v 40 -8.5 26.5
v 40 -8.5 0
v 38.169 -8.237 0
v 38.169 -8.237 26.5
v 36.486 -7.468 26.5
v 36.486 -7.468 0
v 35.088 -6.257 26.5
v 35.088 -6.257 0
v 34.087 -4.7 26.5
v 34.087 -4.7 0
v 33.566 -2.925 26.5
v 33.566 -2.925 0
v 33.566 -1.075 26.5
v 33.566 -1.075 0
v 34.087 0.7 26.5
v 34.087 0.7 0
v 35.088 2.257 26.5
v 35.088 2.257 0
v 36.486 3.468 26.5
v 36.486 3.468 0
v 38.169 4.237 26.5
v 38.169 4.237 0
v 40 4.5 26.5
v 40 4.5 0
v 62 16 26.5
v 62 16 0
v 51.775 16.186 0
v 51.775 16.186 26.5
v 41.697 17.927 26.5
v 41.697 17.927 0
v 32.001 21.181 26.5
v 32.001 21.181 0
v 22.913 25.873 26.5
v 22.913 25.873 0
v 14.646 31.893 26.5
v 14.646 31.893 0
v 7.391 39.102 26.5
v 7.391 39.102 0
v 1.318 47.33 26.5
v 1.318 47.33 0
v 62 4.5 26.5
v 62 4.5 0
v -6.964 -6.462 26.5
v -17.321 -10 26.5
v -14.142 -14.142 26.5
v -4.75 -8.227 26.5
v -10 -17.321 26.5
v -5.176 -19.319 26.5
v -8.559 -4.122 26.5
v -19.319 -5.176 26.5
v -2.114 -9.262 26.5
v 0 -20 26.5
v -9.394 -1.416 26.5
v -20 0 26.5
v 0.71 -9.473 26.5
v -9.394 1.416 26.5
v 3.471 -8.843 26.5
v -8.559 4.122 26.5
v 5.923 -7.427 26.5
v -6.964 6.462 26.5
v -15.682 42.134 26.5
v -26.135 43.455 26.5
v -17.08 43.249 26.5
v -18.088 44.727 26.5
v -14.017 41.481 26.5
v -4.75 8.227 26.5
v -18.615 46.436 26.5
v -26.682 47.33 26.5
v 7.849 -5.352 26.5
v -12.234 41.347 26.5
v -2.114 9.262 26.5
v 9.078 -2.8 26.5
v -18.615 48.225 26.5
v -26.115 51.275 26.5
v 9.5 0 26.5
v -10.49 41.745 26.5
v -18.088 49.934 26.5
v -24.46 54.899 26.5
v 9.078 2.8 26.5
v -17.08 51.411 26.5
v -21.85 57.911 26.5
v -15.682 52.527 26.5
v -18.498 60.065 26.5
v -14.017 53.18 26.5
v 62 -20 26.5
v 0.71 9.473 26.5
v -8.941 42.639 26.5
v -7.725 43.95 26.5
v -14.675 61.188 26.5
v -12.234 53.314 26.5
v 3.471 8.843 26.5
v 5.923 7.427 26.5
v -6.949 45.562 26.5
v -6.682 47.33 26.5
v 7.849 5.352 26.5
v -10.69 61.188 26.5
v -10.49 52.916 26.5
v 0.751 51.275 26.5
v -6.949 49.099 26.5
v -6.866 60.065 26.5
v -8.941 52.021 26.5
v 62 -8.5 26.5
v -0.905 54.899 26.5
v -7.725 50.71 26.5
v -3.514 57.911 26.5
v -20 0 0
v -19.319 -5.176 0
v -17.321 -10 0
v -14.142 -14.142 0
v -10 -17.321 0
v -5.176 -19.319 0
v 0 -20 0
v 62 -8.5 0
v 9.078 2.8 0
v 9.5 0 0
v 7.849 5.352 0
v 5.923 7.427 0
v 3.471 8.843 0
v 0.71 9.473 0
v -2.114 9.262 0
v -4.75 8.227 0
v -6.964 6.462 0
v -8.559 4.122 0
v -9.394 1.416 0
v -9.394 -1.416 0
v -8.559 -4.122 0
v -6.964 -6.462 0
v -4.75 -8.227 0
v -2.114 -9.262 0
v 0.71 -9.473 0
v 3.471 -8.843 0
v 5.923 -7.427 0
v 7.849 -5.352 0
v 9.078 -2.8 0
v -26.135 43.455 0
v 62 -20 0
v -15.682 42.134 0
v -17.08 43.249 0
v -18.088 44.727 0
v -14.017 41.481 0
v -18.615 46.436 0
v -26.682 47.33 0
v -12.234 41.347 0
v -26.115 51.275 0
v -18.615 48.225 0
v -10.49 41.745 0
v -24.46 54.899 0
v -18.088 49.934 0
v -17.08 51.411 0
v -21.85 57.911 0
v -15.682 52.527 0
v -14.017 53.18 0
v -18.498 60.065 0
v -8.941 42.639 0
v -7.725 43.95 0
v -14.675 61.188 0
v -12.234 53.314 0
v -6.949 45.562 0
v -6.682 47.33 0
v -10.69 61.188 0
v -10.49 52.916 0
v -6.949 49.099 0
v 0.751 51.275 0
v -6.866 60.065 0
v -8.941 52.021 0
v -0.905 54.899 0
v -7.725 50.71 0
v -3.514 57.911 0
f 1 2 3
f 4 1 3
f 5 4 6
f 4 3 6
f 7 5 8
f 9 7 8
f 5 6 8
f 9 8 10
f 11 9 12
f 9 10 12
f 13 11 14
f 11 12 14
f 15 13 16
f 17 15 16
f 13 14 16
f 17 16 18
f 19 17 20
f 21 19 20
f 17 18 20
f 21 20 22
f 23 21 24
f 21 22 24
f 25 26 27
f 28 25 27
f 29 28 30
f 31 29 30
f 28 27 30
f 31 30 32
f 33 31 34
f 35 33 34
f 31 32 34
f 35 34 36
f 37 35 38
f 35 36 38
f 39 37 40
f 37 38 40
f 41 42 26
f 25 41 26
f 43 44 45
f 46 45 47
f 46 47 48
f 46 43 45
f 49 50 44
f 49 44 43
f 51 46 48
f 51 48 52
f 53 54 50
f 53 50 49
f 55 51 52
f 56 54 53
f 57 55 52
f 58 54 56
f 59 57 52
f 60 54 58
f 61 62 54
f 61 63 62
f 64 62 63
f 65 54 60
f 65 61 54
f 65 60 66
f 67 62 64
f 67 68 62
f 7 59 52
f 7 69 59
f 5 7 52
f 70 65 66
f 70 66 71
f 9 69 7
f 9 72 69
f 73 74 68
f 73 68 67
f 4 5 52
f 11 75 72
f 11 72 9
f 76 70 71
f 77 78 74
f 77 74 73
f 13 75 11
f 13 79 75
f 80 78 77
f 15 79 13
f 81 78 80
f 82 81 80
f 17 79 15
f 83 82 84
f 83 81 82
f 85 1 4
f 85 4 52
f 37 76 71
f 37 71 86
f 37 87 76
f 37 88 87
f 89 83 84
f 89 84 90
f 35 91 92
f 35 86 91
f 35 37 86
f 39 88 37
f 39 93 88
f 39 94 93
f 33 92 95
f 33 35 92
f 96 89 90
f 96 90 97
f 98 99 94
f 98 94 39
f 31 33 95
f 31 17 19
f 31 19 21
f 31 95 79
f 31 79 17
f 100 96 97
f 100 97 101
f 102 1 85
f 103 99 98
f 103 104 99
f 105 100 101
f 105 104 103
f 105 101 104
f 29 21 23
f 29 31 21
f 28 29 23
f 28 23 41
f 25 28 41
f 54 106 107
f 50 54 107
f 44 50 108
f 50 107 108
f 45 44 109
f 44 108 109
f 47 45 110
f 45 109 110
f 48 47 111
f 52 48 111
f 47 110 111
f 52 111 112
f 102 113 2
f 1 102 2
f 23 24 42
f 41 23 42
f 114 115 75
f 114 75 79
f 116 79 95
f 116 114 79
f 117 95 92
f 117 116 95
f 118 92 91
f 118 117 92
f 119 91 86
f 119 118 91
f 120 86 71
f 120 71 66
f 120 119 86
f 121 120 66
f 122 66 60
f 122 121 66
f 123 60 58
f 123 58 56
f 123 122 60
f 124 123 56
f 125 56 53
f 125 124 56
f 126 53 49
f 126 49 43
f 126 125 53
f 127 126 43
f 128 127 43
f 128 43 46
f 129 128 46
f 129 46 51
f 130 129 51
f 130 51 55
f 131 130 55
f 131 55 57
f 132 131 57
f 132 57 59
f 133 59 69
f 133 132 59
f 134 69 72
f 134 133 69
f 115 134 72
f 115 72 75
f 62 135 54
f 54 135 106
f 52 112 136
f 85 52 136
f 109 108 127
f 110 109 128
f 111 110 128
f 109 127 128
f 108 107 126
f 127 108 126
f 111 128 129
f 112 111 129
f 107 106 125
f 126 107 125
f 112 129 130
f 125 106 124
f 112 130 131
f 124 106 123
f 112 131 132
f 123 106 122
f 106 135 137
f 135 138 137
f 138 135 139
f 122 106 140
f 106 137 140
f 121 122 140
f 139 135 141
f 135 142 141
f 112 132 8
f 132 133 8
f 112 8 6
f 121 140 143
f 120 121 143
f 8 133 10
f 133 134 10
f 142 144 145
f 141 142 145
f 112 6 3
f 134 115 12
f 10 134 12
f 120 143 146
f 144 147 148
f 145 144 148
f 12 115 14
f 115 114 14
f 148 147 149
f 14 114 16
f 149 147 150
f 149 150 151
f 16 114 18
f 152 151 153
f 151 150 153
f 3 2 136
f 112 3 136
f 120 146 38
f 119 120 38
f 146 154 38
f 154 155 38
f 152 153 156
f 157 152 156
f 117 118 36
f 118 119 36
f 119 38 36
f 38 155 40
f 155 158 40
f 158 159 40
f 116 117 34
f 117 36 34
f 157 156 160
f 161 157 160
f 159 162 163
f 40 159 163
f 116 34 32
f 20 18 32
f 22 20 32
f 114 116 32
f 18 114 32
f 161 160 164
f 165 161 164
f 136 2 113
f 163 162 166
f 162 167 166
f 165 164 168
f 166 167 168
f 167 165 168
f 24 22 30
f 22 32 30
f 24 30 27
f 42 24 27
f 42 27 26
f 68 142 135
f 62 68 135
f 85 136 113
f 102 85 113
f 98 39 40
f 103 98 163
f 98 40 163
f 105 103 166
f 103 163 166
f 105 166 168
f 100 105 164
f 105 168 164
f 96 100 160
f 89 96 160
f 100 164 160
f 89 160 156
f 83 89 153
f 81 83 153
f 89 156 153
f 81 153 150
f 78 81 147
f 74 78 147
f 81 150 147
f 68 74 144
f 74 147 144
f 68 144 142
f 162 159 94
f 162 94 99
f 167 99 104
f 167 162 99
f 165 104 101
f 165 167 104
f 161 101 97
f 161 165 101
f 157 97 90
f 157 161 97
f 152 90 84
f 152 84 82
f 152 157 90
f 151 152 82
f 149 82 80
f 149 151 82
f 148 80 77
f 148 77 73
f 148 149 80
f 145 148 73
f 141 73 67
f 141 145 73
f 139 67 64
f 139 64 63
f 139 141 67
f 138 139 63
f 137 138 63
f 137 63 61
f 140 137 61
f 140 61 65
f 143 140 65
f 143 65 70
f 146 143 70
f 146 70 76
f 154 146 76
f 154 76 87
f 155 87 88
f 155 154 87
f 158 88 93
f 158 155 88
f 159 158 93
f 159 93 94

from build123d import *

# Parameters (mm, degrees)
SKETCH1_R           = 6
SKETCH1_R_2         = 20
SKETCH1_R_3         = 9.5
BOSS_EXTRUDE1_DEPTH = 26.5


with BuildPart() as part:
    # Sketch1 → Boss-Extrude1 (new body)
    # profile 1 of 3: a face of its own
    with BuildSketch(Plane.XY):
        with BuildLine():
            ThreePointArc((1.31786679, 47.330365488), (-10.725012101, 33.46783769), (-26.134944205, 43.454558949))
            Line((-26.134944205, 43.454558949), (-20, 0))
            ThreePointArc((-20, 0), (0, 20), (20, 0))
            ThreePointArc((20, 0), (14.142135624, -14.142135624), (0, -20))
            Line((0, -20), (62, -20))
            Line((62, -20), (62, -8.5))
            Line((62, -8.5), (40, -8.5))
            ThreePointArc((40, -8.5), (33.5, -2), (40, 4.5))
            Line((40, 4.5), (62, 4.5))
            Line((62, 4.5), (62, 16))
            ThreePointArc((62, 16), (27.367488456, 23.353309282), (1.31786679, 47.330365488))
        make_face()
    # profile 2 of 3: a face of its own
    with BuildSketch(Plane.XY):
        with BuildLine():
            ThreePointArc((1.31786679, 47.330365488), (-12.68213321, 61.330365488), (-26.68213321, 47.330365488))
            Line((-26.68213321, 47.330365488), (-26.134944205, 43.454558949))
            ThreePointArc((-26.134944205, 43.454558949), (-10.725012101, 33.46783769), (1.31786679, 47.330365488))
        make_face()
        with Locations((-12.68213321, 47.330365488)):
            Circle(SKETCH1_R, mode=Mode.SUBTRACT)
    # profile 3 of 3: a face of its own
    with BuildSketch(Plane.XY):
        Circle(SKETCH1_R_2)
        Circle(SKETCH1_R_3, mode=Mode.SUBTRACT)
    extrude(amount=BOSS_EXTRUDE1_DEPTH)


solid = part.part
